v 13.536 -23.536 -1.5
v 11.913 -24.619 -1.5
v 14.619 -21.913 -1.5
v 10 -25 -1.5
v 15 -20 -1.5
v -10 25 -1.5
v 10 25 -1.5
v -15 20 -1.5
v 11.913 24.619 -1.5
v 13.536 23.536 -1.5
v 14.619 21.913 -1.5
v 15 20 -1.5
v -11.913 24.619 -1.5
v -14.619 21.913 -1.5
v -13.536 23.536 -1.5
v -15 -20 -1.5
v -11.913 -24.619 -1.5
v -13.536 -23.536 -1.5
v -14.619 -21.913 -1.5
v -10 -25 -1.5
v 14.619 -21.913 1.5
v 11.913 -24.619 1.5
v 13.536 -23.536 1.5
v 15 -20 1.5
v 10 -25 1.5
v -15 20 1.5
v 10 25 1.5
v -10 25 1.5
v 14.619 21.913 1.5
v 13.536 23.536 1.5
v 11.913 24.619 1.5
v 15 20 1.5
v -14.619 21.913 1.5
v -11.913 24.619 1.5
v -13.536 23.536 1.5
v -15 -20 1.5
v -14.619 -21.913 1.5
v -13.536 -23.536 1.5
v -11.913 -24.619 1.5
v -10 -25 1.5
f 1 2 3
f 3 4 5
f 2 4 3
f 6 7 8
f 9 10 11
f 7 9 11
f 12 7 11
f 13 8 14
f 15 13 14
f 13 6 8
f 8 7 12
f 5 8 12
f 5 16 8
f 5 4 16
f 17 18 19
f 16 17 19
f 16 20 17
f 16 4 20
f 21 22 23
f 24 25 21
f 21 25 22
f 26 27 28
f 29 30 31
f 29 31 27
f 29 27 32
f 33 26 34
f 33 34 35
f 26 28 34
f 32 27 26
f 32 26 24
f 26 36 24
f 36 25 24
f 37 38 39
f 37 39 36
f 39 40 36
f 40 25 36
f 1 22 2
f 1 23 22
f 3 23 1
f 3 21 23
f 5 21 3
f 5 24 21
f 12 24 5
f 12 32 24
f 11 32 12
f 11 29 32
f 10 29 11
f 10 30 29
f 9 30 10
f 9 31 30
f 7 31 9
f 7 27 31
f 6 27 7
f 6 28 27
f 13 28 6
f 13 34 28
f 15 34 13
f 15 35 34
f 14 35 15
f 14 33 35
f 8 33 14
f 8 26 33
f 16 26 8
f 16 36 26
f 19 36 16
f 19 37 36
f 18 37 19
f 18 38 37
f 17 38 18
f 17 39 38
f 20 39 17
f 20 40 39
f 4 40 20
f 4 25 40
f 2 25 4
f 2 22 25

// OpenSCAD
/*
 * Cake embossing
 * A Stamp on the cake. ELLIE, EVA, FEFE, BABA.
 * Uncomment at will. Works with images.
 */
echo(version=version());

// Base plate
// ----------
plateWidth = 30;    // 50
plateLength = 50;   // 50
plateThickNess = 3;
cornerRadius = 5; // 0; // 10;

logo = "../images/brech/ellie.flip.png"; 
// logo = "../images/brech/eva.flip.png"; 
// logo = "../images/brech/fefe.flip.png"; 
// logo = "../images/brech/baba.flip.png"; 

imgRatio = 1.0;
logox = 448 * imgRatio; 
logoy = 450 * imgRatio; 

module roundedRect(size, radius) {  
	linear_extrude(height=size.z, center=true) {
		offset(radius) { 
      offset(-radius) {
        square([size.x, size.y], center = true);
      }
		}
	}
}

difference() {  
	union() {
		//difference() {
			roundedRect([plateWidth, plateLength, plateThickNess], cornerRadius);
			translate([0, 0, 3.5]) {
				scale([.9 * plateWidth / logox, .9 * plateWidth / logoy, .02]) {
					//color("white") {
						rotate([0, 0, -90]) {
							surface(file=logo, invert=true, center=true);
						}
					//}
				}
			}
		//}
	}
}
